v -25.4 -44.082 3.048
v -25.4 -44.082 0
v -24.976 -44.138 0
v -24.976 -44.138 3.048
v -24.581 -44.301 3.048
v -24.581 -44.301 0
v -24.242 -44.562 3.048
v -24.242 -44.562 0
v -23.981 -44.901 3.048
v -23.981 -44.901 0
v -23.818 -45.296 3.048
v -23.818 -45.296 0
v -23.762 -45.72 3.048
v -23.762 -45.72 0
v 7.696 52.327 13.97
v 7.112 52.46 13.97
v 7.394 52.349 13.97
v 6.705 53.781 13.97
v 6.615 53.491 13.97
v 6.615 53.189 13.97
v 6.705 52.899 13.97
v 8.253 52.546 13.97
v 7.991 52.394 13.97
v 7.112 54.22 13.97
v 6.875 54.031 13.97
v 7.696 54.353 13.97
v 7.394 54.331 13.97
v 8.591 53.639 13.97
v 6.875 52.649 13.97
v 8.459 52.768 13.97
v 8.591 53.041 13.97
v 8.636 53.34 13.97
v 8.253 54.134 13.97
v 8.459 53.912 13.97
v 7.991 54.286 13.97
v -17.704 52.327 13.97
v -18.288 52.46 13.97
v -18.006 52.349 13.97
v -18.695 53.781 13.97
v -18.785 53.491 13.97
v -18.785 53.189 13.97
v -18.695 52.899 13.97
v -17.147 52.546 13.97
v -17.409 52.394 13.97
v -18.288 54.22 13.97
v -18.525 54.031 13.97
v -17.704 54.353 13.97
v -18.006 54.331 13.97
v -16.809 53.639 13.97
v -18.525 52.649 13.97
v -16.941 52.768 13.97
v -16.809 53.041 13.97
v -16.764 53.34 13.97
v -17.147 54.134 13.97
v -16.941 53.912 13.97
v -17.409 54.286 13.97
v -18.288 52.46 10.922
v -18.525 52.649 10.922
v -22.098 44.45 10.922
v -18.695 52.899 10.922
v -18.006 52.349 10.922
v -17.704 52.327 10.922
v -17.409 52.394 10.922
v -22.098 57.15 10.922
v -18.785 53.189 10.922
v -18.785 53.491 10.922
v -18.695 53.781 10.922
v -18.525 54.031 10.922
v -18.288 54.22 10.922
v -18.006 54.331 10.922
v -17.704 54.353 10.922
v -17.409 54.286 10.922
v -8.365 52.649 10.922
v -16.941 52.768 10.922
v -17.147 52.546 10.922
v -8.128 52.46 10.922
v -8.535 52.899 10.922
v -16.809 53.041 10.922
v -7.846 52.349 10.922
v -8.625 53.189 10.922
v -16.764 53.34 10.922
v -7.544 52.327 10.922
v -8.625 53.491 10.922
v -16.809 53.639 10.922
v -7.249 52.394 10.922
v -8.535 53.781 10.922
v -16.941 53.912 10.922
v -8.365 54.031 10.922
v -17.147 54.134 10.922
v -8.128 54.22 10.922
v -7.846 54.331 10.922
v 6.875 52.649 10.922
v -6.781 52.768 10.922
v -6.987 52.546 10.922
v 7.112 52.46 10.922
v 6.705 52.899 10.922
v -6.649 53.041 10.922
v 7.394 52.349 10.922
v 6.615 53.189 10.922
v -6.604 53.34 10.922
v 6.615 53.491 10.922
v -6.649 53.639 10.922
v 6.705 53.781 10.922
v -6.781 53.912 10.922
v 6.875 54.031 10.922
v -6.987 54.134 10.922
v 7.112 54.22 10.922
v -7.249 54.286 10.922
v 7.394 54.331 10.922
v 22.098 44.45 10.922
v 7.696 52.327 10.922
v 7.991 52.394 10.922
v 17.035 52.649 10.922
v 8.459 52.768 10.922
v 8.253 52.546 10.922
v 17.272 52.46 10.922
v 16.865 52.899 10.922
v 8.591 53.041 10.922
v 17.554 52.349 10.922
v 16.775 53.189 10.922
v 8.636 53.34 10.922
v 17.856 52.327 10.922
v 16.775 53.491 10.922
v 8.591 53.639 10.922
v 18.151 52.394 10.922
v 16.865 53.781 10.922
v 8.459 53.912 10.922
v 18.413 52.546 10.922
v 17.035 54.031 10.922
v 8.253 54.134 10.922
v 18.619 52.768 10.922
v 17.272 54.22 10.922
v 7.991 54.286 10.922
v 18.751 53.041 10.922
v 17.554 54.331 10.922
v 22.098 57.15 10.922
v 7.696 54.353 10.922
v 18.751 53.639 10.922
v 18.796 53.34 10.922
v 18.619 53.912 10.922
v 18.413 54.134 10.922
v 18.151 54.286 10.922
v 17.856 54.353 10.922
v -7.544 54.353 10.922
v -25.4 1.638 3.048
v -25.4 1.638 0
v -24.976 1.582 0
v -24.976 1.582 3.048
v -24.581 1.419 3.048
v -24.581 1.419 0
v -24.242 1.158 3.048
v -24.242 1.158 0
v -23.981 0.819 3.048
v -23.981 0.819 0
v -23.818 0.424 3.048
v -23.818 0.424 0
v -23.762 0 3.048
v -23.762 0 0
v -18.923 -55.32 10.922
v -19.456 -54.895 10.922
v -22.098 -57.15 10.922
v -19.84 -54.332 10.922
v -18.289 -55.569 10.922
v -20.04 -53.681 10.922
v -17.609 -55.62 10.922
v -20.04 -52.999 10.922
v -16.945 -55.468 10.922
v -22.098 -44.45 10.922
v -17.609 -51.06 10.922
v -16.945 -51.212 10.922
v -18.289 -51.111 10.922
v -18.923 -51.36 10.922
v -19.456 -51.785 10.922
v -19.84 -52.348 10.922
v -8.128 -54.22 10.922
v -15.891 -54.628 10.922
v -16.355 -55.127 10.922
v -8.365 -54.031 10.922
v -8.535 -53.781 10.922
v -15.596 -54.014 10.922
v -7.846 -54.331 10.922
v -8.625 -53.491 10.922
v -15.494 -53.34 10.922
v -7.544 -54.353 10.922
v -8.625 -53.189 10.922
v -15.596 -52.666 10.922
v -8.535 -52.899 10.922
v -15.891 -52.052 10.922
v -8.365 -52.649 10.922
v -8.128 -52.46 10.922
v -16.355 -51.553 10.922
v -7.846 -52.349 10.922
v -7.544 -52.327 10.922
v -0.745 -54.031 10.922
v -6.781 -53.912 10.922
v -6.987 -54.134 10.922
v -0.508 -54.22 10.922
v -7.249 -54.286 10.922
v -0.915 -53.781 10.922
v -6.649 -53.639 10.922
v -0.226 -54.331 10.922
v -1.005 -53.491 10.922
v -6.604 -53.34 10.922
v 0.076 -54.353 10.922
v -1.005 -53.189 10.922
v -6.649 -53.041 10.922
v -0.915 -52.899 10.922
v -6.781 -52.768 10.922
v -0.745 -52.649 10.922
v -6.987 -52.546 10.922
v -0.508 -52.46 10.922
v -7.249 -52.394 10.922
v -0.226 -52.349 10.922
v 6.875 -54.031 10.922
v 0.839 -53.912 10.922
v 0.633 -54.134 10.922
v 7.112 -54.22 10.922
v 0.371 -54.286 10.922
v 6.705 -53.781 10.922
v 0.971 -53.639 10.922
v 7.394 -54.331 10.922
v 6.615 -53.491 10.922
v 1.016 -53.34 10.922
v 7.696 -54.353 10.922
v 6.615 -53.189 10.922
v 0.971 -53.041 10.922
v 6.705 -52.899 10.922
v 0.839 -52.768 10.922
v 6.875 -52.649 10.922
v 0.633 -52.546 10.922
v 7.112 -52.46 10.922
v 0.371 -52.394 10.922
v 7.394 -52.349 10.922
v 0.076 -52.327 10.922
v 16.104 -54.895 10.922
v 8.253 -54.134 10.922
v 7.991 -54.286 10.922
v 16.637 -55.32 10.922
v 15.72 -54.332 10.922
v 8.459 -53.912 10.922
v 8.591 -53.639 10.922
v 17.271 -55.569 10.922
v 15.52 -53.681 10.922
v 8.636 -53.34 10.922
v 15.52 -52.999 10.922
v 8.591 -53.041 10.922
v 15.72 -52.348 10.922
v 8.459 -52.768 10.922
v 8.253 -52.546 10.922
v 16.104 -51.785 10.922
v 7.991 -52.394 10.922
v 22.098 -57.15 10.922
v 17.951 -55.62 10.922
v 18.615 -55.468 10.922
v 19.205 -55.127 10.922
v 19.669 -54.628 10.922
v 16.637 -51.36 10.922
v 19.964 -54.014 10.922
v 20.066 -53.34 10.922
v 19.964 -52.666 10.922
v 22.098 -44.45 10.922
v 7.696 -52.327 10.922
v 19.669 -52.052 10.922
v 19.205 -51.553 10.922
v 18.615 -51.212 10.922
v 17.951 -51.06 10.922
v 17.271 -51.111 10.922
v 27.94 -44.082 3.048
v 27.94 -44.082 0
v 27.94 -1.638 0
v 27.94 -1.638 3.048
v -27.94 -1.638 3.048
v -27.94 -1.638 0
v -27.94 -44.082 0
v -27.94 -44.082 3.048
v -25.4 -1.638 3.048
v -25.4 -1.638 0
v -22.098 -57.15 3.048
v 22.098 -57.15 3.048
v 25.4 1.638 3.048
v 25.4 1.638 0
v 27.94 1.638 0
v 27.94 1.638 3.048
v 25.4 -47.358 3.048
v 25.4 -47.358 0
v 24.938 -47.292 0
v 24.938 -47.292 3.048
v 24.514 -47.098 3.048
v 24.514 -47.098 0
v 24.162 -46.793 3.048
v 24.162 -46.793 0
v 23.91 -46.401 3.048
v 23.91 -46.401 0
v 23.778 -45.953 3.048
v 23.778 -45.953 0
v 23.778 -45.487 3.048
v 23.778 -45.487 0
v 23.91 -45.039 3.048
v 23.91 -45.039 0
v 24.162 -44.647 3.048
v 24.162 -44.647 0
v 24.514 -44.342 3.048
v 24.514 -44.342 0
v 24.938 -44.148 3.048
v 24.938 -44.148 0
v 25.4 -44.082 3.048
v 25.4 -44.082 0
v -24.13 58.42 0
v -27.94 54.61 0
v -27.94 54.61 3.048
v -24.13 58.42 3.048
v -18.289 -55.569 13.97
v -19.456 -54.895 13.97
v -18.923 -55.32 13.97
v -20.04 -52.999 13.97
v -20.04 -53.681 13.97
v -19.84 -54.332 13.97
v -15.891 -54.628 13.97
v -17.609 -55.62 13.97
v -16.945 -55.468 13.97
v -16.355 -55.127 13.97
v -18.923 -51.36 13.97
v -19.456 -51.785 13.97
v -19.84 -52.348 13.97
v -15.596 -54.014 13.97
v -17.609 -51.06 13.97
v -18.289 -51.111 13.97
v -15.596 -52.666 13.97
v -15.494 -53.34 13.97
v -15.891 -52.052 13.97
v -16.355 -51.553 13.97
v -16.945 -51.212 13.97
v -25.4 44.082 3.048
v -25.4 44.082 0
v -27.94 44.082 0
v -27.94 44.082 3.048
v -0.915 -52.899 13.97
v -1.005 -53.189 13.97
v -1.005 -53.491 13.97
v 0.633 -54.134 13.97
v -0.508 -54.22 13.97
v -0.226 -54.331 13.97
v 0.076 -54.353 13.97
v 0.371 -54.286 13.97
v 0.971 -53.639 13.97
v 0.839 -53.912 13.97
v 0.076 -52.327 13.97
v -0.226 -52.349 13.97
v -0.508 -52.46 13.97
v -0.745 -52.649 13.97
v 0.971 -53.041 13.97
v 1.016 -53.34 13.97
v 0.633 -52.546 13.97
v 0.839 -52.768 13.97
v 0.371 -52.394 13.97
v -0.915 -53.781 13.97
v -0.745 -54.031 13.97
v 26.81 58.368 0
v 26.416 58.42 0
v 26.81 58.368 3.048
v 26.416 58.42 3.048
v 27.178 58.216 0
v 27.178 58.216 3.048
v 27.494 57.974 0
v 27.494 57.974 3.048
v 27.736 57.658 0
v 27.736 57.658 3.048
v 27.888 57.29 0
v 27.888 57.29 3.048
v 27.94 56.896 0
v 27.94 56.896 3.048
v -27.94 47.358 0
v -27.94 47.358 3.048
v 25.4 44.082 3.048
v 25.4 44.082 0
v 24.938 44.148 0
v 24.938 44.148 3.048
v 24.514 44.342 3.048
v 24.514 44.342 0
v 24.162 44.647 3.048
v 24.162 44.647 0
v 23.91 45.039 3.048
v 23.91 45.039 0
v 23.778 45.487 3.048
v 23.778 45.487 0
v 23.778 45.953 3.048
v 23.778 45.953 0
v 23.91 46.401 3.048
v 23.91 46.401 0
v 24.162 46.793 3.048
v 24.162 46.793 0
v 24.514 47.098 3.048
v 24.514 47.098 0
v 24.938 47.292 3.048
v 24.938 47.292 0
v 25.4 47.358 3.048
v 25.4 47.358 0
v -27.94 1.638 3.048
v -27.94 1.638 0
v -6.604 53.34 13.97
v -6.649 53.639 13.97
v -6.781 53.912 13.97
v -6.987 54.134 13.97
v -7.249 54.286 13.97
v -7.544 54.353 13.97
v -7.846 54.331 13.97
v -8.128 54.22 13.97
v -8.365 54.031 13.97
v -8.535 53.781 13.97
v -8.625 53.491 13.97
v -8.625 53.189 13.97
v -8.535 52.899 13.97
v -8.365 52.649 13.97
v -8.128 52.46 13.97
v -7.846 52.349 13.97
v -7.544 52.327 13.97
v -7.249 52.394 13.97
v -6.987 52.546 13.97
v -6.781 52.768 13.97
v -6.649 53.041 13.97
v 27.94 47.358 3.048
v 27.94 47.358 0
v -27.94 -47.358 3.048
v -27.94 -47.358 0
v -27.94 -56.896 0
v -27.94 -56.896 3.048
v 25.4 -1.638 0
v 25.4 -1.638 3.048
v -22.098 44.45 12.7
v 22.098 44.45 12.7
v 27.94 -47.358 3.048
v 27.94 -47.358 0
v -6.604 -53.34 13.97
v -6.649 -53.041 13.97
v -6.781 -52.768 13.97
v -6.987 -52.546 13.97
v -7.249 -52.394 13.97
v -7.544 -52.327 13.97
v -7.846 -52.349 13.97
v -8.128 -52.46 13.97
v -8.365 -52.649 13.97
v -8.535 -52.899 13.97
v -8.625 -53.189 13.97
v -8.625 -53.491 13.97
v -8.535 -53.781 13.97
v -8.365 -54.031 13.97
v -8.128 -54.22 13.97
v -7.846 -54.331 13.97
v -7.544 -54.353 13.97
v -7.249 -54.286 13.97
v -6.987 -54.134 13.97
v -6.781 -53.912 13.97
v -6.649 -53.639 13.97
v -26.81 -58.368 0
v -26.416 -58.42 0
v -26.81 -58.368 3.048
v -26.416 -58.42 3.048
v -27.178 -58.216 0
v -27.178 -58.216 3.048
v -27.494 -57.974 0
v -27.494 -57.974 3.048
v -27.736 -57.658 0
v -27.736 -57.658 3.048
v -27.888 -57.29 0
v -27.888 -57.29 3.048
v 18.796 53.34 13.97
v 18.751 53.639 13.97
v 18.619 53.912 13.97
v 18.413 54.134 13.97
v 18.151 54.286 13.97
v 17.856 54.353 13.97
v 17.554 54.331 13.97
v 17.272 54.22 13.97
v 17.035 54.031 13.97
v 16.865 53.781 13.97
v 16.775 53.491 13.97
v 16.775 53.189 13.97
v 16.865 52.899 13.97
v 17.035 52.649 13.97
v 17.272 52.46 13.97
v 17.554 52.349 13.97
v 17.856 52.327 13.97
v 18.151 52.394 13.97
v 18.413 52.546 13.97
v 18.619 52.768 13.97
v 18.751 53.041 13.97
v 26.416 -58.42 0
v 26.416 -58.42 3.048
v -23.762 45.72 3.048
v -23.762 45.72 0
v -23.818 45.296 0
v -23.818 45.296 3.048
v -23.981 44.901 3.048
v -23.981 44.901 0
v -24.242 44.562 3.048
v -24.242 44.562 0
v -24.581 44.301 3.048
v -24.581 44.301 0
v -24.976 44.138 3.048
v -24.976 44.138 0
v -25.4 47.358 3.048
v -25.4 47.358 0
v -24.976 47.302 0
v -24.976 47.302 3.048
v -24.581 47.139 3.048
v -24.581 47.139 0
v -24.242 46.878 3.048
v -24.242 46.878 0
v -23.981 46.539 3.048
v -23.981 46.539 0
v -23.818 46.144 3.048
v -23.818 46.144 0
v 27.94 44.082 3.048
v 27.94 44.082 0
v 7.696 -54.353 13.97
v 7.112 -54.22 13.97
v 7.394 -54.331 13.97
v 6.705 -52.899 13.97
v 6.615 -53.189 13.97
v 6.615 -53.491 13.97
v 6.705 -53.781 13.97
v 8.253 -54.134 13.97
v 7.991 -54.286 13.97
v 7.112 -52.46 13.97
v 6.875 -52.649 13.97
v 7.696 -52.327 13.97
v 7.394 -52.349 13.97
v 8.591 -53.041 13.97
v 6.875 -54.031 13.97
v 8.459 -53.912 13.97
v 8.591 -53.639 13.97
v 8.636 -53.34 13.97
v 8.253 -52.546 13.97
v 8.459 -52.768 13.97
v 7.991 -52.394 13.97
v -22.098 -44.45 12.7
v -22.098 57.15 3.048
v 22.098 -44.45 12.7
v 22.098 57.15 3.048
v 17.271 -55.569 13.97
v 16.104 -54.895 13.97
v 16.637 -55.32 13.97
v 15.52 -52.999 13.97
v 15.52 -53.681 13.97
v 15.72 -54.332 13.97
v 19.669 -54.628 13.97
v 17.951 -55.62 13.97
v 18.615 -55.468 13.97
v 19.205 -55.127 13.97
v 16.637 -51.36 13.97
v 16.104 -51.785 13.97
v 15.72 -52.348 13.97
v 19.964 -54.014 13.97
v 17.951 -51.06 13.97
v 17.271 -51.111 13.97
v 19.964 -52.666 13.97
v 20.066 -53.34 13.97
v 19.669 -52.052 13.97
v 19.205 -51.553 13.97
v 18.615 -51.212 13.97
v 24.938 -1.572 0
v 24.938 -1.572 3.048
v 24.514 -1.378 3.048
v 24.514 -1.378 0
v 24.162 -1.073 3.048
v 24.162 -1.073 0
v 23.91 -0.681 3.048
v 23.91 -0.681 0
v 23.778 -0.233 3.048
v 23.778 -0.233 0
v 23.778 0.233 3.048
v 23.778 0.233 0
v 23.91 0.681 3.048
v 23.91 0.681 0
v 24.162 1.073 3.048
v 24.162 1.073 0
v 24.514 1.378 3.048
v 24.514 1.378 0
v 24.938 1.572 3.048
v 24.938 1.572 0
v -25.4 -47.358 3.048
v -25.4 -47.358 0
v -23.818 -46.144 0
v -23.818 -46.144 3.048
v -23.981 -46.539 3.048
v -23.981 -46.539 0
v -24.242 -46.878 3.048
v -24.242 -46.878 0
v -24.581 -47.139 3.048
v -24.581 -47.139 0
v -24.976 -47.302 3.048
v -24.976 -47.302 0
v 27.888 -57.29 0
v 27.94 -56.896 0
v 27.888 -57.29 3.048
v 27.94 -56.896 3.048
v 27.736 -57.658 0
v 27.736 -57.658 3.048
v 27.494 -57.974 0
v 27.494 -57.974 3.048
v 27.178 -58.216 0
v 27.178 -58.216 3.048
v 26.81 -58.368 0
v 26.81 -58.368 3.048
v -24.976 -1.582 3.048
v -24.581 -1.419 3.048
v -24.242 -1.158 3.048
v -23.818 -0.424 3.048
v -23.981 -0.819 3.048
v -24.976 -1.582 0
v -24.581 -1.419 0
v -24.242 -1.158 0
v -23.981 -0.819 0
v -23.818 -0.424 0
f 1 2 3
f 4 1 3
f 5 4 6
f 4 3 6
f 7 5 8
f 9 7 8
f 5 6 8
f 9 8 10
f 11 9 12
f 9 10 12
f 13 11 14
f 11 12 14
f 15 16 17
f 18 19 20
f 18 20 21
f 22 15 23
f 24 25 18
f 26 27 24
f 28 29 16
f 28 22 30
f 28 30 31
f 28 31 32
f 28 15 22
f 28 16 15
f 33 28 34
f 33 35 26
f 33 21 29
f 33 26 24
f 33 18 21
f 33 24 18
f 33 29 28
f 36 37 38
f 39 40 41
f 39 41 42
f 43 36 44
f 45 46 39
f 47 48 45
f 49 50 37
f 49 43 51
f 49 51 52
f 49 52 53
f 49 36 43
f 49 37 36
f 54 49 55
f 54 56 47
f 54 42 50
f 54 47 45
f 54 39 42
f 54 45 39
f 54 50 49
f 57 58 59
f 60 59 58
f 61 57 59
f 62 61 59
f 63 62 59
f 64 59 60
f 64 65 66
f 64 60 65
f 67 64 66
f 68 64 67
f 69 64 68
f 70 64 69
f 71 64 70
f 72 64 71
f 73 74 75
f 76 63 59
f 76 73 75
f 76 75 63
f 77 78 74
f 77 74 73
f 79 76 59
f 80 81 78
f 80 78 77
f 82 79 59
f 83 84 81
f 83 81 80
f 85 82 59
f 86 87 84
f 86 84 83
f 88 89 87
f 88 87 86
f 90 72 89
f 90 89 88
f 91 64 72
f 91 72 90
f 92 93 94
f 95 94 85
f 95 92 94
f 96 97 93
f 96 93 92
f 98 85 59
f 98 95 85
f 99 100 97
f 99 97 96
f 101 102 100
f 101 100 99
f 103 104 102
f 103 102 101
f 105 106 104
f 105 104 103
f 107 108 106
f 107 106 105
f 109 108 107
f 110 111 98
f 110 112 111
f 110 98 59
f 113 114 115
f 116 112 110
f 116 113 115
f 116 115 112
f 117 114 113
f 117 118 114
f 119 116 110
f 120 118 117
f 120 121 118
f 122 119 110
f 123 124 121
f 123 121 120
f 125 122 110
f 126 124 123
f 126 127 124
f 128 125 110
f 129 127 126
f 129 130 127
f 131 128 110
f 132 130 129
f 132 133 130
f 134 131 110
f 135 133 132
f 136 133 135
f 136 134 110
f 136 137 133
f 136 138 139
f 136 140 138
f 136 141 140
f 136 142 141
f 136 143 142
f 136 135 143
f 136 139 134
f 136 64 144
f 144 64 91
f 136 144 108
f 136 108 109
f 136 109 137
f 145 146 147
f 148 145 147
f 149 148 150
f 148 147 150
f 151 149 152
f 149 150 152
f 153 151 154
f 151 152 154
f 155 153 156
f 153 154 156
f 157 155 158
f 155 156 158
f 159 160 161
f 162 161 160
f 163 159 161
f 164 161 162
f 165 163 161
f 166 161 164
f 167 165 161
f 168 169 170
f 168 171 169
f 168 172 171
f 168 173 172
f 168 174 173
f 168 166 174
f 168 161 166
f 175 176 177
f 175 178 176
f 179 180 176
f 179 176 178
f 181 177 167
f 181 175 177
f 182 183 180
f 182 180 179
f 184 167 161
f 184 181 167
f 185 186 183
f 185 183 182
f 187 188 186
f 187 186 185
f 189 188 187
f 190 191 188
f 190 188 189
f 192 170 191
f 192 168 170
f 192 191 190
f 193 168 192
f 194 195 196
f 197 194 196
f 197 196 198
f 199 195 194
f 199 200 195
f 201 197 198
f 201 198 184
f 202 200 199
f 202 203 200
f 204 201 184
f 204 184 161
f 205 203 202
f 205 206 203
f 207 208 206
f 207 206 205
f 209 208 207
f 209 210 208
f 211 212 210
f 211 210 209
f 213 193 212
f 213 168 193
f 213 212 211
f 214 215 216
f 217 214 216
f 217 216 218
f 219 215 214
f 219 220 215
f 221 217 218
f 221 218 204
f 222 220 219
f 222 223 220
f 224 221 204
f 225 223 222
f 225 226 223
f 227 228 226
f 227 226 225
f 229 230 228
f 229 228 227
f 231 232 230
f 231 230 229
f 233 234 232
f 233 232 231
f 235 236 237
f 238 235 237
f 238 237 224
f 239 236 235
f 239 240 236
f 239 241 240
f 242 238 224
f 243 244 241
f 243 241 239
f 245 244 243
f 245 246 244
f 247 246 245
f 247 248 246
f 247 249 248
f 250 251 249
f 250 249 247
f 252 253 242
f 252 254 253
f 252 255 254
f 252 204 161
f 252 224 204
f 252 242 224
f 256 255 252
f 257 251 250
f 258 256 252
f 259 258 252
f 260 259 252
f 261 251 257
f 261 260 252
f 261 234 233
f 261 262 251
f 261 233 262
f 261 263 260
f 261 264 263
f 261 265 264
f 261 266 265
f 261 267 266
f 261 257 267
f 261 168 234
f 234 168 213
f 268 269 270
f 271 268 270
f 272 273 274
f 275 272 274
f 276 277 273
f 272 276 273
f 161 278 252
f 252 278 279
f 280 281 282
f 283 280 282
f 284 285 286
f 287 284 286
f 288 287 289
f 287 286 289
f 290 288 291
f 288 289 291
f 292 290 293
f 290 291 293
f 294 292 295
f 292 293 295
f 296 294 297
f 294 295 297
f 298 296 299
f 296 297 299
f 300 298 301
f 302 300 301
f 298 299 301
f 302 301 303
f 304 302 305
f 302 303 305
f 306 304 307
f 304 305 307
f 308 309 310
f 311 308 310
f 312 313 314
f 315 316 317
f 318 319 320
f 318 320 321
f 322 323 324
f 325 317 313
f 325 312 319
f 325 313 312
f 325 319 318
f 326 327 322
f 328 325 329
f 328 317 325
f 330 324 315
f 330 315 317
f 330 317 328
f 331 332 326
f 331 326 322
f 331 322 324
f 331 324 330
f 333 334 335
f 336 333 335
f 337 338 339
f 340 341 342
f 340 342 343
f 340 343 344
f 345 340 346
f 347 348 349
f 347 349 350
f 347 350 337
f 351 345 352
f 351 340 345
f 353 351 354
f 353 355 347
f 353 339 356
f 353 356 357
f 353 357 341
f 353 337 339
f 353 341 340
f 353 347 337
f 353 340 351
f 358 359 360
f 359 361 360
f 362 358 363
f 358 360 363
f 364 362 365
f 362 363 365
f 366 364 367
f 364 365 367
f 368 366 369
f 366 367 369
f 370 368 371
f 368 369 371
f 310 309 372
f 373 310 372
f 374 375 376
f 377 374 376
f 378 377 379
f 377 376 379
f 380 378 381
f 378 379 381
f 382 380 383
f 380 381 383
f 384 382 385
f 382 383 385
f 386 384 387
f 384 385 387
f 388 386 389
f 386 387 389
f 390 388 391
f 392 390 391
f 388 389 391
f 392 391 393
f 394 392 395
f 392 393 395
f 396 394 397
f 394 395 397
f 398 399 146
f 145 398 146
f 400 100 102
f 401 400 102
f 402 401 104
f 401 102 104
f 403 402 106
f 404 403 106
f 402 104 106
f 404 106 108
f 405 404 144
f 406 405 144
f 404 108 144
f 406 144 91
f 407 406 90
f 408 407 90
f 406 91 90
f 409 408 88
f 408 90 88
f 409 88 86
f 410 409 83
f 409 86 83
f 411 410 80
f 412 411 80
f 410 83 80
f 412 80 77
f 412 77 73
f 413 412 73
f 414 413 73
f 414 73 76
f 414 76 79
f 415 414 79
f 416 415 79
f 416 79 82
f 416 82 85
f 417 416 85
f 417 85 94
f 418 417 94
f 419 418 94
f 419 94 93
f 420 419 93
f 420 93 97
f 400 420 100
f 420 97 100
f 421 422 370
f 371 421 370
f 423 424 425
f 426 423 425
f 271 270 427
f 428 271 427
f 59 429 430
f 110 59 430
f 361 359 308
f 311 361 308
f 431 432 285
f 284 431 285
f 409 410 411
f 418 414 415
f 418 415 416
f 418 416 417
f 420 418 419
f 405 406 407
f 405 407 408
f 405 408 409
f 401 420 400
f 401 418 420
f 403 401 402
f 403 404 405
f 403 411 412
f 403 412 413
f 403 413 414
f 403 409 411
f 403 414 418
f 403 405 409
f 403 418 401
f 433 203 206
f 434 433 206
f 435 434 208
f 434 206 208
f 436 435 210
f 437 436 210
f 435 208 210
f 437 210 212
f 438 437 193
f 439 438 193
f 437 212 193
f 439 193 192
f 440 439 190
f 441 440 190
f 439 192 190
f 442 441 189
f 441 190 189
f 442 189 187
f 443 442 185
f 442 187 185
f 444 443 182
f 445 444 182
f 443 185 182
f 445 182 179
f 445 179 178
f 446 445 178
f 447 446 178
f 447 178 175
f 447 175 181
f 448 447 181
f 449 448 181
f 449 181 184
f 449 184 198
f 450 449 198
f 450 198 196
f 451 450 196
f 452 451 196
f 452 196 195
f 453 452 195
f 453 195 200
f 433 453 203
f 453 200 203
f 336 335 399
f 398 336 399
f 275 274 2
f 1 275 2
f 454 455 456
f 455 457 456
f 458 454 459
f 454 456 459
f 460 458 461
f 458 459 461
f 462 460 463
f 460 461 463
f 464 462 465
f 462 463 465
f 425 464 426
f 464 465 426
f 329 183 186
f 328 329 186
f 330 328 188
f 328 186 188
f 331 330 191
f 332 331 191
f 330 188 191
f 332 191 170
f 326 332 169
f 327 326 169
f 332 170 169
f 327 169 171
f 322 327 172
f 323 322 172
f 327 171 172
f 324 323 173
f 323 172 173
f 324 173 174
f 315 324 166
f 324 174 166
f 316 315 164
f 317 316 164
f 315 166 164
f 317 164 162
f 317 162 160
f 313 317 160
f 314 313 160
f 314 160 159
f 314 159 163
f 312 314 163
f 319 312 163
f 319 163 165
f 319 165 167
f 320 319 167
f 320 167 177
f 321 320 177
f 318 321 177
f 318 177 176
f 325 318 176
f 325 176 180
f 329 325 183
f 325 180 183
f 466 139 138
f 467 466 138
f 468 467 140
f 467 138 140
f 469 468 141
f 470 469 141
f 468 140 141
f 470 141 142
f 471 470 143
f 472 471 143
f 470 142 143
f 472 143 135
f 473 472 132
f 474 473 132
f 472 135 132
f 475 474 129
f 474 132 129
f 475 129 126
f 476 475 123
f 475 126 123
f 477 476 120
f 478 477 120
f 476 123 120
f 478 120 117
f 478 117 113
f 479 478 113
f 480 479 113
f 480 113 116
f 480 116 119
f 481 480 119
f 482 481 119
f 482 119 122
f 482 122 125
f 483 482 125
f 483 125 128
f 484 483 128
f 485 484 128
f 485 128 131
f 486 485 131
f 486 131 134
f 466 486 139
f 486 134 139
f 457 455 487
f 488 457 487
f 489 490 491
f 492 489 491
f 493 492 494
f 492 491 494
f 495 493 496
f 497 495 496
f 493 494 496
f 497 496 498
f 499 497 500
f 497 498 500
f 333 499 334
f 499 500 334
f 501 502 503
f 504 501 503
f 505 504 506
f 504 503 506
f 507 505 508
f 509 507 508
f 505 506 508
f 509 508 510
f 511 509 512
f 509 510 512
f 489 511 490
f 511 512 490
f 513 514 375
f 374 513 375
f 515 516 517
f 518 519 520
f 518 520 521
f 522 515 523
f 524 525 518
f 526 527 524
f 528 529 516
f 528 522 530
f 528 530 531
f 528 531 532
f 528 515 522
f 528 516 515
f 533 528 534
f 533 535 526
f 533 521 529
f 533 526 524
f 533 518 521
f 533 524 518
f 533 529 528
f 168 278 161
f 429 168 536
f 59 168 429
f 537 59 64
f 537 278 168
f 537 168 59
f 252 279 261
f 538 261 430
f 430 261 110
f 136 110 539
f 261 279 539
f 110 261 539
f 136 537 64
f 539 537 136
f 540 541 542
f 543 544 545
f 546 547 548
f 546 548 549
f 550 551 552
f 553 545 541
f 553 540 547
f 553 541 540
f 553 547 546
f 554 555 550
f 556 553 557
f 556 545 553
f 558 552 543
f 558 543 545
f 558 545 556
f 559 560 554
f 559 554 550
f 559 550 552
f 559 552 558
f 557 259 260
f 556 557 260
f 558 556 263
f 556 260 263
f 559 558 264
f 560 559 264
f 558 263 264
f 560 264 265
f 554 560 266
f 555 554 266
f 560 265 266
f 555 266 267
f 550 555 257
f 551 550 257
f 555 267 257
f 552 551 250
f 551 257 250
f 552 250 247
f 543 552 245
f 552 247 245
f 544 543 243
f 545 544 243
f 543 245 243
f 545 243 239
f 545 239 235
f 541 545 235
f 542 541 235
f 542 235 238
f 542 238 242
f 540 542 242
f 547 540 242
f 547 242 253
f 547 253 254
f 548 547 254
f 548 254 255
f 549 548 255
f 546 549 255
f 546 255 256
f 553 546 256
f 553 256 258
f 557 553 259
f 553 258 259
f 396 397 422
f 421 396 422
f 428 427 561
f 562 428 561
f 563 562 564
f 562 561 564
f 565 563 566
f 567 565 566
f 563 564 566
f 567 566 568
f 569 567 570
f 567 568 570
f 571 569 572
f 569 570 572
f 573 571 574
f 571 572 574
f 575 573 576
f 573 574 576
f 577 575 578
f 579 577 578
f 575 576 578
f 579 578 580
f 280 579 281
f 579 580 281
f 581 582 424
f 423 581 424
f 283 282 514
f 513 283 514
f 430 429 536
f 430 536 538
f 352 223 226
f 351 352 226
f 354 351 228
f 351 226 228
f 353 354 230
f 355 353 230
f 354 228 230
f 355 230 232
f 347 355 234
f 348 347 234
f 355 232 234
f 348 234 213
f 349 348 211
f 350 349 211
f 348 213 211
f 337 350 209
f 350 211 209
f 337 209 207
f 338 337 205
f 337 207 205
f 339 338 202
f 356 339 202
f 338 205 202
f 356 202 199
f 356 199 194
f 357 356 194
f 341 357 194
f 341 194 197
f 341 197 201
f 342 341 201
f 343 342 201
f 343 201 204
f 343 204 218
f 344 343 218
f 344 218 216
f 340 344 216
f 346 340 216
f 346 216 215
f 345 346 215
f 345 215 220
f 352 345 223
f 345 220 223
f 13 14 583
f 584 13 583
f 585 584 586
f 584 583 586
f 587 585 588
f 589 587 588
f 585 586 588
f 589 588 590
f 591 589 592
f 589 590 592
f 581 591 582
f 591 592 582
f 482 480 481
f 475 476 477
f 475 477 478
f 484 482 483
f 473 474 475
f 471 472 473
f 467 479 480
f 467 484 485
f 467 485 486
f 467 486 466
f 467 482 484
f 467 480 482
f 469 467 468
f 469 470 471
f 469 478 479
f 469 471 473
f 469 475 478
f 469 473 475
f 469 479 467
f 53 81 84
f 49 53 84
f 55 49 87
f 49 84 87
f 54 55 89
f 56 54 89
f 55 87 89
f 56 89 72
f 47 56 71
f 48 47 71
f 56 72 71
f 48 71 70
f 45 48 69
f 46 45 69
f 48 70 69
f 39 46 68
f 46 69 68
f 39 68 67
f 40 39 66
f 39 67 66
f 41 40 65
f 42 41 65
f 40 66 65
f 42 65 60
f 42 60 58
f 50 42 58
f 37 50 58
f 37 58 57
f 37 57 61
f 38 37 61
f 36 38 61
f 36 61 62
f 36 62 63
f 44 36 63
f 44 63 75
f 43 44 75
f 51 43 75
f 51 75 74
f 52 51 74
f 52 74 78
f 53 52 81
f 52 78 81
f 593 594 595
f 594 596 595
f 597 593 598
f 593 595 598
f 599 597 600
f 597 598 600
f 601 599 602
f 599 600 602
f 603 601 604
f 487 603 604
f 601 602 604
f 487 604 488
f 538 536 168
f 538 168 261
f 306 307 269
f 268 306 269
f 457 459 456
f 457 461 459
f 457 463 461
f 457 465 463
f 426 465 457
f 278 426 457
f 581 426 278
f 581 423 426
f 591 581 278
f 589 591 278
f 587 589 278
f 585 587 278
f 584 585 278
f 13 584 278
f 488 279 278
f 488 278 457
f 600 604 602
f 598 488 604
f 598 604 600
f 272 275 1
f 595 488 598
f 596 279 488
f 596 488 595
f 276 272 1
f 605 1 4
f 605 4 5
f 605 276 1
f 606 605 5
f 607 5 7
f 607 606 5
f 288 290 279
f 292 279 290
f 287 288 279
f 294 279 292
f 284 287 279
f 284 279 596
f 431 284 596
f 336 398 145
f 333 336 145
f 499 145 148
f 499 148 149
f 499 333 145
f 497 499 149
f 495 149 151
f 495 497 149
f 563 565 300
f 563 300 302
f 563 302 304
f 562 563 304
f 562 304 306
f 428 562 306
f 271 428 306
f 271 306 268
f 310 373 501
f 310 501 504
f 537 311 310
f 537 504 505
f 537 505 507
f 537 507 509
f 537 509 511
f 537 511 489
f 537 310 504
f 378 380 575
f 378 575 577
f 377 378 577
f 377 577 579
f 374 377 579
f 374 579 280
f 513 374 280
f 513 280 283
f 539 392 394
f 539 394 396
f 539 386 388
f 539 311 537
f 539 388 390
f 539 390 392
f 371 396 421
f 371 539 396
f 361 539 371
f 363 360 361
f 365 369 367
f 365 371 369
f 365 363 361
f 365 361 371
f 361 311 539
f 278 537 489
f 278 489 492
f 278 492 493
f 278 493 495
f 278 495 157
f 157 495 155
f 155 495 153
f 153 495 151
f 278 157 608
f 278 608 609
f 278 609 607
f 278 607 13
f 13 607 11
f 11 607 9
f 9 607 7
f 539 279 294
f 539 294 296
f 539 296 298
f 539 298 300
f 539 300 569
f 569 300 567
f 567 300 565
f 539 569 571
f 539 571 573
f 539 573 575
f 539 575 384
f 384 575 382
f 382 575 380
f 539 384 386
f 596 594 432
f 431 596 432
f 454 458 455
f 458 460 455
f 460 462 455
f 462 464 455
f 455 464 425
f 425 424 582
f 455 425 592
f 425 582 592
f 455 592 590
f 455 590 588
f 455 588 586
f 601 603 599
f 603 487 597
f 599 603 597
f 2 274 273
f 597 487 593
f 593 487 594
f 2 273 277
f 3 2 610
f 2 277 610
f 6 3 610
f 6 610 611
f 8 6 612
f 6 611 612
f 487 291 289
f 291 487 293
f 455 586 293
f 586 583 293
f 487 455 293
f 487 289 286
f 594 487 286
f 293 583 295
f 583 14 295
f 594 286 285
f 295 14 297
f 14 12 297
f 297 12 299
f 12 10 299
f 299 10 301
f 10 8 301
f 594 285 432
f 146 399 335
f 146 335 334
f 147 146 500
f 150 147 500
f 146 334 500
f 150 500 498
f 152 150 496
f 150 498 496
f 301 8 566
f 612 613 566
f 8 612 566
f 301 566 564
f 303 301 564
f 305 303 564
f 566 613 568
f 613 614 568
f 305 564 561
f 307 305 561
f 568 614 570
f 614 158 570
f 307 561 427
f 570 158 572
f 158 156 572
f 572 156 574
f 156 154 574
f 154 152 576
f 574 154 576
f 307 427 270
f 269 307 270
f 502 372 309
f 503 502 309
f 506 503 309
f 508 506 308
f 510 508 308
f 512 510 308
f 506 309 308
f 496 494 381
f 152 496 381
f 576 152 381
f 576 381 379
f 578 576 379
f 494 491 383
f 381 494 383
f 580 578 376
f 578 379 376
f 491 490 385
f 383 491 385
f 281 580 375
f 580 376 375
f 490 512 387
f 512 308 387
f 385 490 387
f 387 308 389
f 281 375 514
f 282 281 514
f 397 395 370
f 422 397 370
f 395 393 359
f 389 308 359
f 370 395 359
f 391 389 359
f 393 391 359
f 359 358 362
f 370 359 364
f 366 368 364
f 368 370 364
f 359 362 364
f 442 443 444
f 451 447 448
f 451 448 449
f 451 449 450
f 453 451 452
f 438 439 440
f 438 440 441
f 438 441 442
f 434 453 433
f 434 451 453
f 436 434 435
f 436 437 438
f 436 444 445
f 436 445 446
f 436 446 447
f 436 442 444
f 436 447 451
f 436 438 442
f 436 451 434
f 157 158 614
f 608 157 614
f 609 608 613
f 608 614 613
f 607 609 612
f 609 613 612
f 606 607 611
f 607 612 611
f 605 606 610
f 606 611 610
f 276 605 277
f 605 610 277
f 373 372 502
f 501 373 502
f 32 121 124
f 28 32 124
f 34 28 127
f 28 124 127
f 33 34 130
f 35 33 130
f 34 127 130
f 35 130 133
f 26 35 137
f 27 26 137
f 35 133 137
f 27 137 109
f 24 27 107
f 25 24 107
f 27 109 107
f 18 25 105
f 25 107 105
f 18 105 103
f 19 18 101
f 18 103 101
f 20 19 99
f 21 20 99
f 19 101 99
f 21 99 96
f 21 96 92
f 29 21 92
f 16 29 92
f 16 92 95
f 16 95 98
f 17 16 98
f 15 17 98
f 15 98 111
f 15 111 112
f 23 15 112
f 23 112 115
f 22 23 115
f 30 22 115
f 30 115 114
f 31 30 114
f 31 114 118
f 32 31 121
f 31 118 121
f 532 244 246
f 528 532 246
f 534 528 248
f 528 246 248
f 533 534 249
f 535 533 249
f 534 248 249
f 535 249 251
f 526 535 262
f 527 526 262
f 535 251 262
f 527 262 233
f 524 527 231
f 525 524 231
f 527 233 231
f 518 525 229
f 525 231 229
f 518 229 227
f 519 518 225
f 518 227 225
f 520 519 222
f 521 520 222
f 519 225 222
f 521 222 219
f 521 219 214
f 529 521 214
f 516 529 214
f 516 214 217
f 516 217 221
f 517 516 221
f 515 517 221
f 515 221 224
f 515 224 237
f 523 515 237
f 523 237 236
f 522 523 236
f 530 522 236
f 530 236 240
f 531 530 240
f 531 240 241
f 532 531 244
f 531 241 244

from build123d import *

# Parameters (mm, degrees)
F1_DEPTH  = 3.048
F2_SIZE   = 3.81
F3_R      = 1.524
F4_W      = 44.196
F4_H      = 114.3
F5_DEPTH  = 9.652
F6_W      = 44.196
F6_H      = 12.7
F7_DEPTH  = 1.778
F8_R      = 2.286
F9_DEPTH  = 3.048
F10_R     = 1.016
F11_DEPTH = 3.048


with BuildPart() as f1:
    # F0 (on Top) → F1 (new body)
    with BuildSketch(Plane.XY):
        with BuildLine():
            Line((-27.94, -58.42), (27.94, -58.42))
            Line((27.94, -58.42), (27.94, -47.3583))
            Line((27.94, -47.3583), (25.4, -47.3583))
            ThreePointArc((25.4, -47.3583), (23.7617, -45.72), (25.4, -44.0817))
            Line((25.4, -44.0817), (27.94, -44.0817))
            Line((27.94, -44.0817), (27.94, -1.6383))
            Line((27.94, -1.6383), (25.4, -1.6383))
            ThreePointArc((25.4, -1.6383), (23.7617, 0), (25.4, 1.6383))
            Line((25.4, 1.6383), (27.94, 1.6383))
            Line((27.94, 1.6383), (27.94, 44.0817))
            Line((27.94, 44.0817), (25.4, 44.0817))
            ThreePointArc((25.4, 44.0817), (23.7617, 45.72), (25.4, 47.3583))
            Line((25.4, 47.3583), (27.94, 47.3583))
            Line((27.94, 47.3583), (27.94, 58.42))
            Line((27.94, 58.42), (-27.94, 58.42))
            Line((-27.94, 58.42), (-27.94, 47.3583))
            Line((-27.94, 47.3583), (-25.4, 47.3583))
            ThreePointArc((-25.4, 47.3583), (-24.241547, 46.878453), (-23.7617, 45.72))
            ThreePointArc((-23.7617, 45.72), (-24.241547, 44.561547), (-25.4, 44.0817))
            Line((-25.4, 44.0817), (-27.94, 44.0817))
            Line((-27.94, 44.0817), (-27.94, 1.6383))
            Line((-27.94, 1.6383), (-25.4, 1.6383))
            ThreePointArc((-25.4, 1.6383), (-24.241547, 1.158453), (-23.7617, 0))
            ThreePointArc((-23.7617, 0), (-24.241547, -1.158453), (-25.4, -1.6383))
            Line((-25.4, -1.6383), (-27.94, -1.6383))
            Line((-27.94, -1.6383), (-27.94, -44.0817))
            Line((-27.94, -44.0817), (-25.4, -44.0817))
            ThreePointArc((-25.4, -44.0817), (-24.241547, -44.561547), (-23.7617, -45.72))
            ThreePointArc((-23.7617, -45.72), (-24.241547, -46.878453), (-25.4, -47.3583))
            Line((-25.4, -47.3583), (-27.94, -47.3583))
            Line((-27.94, -47.3583), (-27.94, -58.42))
        make_face()
    extrude(amount=F1_DEPTH)

    # F2
    f2_edges = [f1.edges().sort_by_distance(p)[0] for p in [
        (-27.94, 58.42, 1.524),
    ]]
    chamfer(f2_edges, length=F2_SIZE)

    # F3
    f3_edges = [f1.edges().sort_by_distance(p)[0] for p in [
        (27.94, 58.42, 1.524),
        (27.94, -58.42, 1.524),
        (-27.94, -58.42, 1.524),
    ]]
    fillet(f3_edges, radius=F3_R)

    # F4 (on face) → F5 (join)
    with BuildSketch(Plane.XY.offset(3.048)):
        Rectangle(F4_W, F4_H)
    extrude(amount=F5_DEPTH)

    # F6 (on face) → F7 (cut)
    with BuildSketch(Plane.XY.offset(12.7)):
        with Locations((0, -50.8)):
            Rectangle(F6_W, F6_H)
        with Locations((0, 50.8)):
            Rectangle(F6_W, F6_H)
    extrude(amount=-F7_DEPTH, mode=Mode.SUBTRACT)

    # F8 (on face) → F9 (join)
    with BuildSketch(Plane.XY.offset(10.922)):
        with Locations((-17.78, -53.34)):
            Circle(F8_R)
        with Locations((17.78, -53.34)):
            Circle(F8_R)
    extrude(amount=F9_DEPTH)

    # F10 (on face) → F11 (join, through all)
    with BuildSketch(Plane.XY.offset(10.922)):
        with Locations((-7.62, -53.34)):
            Circle(F10_R)
        with Locations((0, -53.34)):
            Circle(F10_R)
        with Locations((7.62, -53.34)):
            Circle(F10_R)
        with Locations((-17.78, 53.34)):
            Circle(F10_R)
        with Locations((-7.62, 53.34)):
            Circle(F10_R)
        with Locations((7.62, 53.34)):
            Circle(F10_R)
        with Locations((17.78, 53.34)):
            Circle(F10_R)
    extrude(amount=F11_DEPTH)


solid = f1.part
